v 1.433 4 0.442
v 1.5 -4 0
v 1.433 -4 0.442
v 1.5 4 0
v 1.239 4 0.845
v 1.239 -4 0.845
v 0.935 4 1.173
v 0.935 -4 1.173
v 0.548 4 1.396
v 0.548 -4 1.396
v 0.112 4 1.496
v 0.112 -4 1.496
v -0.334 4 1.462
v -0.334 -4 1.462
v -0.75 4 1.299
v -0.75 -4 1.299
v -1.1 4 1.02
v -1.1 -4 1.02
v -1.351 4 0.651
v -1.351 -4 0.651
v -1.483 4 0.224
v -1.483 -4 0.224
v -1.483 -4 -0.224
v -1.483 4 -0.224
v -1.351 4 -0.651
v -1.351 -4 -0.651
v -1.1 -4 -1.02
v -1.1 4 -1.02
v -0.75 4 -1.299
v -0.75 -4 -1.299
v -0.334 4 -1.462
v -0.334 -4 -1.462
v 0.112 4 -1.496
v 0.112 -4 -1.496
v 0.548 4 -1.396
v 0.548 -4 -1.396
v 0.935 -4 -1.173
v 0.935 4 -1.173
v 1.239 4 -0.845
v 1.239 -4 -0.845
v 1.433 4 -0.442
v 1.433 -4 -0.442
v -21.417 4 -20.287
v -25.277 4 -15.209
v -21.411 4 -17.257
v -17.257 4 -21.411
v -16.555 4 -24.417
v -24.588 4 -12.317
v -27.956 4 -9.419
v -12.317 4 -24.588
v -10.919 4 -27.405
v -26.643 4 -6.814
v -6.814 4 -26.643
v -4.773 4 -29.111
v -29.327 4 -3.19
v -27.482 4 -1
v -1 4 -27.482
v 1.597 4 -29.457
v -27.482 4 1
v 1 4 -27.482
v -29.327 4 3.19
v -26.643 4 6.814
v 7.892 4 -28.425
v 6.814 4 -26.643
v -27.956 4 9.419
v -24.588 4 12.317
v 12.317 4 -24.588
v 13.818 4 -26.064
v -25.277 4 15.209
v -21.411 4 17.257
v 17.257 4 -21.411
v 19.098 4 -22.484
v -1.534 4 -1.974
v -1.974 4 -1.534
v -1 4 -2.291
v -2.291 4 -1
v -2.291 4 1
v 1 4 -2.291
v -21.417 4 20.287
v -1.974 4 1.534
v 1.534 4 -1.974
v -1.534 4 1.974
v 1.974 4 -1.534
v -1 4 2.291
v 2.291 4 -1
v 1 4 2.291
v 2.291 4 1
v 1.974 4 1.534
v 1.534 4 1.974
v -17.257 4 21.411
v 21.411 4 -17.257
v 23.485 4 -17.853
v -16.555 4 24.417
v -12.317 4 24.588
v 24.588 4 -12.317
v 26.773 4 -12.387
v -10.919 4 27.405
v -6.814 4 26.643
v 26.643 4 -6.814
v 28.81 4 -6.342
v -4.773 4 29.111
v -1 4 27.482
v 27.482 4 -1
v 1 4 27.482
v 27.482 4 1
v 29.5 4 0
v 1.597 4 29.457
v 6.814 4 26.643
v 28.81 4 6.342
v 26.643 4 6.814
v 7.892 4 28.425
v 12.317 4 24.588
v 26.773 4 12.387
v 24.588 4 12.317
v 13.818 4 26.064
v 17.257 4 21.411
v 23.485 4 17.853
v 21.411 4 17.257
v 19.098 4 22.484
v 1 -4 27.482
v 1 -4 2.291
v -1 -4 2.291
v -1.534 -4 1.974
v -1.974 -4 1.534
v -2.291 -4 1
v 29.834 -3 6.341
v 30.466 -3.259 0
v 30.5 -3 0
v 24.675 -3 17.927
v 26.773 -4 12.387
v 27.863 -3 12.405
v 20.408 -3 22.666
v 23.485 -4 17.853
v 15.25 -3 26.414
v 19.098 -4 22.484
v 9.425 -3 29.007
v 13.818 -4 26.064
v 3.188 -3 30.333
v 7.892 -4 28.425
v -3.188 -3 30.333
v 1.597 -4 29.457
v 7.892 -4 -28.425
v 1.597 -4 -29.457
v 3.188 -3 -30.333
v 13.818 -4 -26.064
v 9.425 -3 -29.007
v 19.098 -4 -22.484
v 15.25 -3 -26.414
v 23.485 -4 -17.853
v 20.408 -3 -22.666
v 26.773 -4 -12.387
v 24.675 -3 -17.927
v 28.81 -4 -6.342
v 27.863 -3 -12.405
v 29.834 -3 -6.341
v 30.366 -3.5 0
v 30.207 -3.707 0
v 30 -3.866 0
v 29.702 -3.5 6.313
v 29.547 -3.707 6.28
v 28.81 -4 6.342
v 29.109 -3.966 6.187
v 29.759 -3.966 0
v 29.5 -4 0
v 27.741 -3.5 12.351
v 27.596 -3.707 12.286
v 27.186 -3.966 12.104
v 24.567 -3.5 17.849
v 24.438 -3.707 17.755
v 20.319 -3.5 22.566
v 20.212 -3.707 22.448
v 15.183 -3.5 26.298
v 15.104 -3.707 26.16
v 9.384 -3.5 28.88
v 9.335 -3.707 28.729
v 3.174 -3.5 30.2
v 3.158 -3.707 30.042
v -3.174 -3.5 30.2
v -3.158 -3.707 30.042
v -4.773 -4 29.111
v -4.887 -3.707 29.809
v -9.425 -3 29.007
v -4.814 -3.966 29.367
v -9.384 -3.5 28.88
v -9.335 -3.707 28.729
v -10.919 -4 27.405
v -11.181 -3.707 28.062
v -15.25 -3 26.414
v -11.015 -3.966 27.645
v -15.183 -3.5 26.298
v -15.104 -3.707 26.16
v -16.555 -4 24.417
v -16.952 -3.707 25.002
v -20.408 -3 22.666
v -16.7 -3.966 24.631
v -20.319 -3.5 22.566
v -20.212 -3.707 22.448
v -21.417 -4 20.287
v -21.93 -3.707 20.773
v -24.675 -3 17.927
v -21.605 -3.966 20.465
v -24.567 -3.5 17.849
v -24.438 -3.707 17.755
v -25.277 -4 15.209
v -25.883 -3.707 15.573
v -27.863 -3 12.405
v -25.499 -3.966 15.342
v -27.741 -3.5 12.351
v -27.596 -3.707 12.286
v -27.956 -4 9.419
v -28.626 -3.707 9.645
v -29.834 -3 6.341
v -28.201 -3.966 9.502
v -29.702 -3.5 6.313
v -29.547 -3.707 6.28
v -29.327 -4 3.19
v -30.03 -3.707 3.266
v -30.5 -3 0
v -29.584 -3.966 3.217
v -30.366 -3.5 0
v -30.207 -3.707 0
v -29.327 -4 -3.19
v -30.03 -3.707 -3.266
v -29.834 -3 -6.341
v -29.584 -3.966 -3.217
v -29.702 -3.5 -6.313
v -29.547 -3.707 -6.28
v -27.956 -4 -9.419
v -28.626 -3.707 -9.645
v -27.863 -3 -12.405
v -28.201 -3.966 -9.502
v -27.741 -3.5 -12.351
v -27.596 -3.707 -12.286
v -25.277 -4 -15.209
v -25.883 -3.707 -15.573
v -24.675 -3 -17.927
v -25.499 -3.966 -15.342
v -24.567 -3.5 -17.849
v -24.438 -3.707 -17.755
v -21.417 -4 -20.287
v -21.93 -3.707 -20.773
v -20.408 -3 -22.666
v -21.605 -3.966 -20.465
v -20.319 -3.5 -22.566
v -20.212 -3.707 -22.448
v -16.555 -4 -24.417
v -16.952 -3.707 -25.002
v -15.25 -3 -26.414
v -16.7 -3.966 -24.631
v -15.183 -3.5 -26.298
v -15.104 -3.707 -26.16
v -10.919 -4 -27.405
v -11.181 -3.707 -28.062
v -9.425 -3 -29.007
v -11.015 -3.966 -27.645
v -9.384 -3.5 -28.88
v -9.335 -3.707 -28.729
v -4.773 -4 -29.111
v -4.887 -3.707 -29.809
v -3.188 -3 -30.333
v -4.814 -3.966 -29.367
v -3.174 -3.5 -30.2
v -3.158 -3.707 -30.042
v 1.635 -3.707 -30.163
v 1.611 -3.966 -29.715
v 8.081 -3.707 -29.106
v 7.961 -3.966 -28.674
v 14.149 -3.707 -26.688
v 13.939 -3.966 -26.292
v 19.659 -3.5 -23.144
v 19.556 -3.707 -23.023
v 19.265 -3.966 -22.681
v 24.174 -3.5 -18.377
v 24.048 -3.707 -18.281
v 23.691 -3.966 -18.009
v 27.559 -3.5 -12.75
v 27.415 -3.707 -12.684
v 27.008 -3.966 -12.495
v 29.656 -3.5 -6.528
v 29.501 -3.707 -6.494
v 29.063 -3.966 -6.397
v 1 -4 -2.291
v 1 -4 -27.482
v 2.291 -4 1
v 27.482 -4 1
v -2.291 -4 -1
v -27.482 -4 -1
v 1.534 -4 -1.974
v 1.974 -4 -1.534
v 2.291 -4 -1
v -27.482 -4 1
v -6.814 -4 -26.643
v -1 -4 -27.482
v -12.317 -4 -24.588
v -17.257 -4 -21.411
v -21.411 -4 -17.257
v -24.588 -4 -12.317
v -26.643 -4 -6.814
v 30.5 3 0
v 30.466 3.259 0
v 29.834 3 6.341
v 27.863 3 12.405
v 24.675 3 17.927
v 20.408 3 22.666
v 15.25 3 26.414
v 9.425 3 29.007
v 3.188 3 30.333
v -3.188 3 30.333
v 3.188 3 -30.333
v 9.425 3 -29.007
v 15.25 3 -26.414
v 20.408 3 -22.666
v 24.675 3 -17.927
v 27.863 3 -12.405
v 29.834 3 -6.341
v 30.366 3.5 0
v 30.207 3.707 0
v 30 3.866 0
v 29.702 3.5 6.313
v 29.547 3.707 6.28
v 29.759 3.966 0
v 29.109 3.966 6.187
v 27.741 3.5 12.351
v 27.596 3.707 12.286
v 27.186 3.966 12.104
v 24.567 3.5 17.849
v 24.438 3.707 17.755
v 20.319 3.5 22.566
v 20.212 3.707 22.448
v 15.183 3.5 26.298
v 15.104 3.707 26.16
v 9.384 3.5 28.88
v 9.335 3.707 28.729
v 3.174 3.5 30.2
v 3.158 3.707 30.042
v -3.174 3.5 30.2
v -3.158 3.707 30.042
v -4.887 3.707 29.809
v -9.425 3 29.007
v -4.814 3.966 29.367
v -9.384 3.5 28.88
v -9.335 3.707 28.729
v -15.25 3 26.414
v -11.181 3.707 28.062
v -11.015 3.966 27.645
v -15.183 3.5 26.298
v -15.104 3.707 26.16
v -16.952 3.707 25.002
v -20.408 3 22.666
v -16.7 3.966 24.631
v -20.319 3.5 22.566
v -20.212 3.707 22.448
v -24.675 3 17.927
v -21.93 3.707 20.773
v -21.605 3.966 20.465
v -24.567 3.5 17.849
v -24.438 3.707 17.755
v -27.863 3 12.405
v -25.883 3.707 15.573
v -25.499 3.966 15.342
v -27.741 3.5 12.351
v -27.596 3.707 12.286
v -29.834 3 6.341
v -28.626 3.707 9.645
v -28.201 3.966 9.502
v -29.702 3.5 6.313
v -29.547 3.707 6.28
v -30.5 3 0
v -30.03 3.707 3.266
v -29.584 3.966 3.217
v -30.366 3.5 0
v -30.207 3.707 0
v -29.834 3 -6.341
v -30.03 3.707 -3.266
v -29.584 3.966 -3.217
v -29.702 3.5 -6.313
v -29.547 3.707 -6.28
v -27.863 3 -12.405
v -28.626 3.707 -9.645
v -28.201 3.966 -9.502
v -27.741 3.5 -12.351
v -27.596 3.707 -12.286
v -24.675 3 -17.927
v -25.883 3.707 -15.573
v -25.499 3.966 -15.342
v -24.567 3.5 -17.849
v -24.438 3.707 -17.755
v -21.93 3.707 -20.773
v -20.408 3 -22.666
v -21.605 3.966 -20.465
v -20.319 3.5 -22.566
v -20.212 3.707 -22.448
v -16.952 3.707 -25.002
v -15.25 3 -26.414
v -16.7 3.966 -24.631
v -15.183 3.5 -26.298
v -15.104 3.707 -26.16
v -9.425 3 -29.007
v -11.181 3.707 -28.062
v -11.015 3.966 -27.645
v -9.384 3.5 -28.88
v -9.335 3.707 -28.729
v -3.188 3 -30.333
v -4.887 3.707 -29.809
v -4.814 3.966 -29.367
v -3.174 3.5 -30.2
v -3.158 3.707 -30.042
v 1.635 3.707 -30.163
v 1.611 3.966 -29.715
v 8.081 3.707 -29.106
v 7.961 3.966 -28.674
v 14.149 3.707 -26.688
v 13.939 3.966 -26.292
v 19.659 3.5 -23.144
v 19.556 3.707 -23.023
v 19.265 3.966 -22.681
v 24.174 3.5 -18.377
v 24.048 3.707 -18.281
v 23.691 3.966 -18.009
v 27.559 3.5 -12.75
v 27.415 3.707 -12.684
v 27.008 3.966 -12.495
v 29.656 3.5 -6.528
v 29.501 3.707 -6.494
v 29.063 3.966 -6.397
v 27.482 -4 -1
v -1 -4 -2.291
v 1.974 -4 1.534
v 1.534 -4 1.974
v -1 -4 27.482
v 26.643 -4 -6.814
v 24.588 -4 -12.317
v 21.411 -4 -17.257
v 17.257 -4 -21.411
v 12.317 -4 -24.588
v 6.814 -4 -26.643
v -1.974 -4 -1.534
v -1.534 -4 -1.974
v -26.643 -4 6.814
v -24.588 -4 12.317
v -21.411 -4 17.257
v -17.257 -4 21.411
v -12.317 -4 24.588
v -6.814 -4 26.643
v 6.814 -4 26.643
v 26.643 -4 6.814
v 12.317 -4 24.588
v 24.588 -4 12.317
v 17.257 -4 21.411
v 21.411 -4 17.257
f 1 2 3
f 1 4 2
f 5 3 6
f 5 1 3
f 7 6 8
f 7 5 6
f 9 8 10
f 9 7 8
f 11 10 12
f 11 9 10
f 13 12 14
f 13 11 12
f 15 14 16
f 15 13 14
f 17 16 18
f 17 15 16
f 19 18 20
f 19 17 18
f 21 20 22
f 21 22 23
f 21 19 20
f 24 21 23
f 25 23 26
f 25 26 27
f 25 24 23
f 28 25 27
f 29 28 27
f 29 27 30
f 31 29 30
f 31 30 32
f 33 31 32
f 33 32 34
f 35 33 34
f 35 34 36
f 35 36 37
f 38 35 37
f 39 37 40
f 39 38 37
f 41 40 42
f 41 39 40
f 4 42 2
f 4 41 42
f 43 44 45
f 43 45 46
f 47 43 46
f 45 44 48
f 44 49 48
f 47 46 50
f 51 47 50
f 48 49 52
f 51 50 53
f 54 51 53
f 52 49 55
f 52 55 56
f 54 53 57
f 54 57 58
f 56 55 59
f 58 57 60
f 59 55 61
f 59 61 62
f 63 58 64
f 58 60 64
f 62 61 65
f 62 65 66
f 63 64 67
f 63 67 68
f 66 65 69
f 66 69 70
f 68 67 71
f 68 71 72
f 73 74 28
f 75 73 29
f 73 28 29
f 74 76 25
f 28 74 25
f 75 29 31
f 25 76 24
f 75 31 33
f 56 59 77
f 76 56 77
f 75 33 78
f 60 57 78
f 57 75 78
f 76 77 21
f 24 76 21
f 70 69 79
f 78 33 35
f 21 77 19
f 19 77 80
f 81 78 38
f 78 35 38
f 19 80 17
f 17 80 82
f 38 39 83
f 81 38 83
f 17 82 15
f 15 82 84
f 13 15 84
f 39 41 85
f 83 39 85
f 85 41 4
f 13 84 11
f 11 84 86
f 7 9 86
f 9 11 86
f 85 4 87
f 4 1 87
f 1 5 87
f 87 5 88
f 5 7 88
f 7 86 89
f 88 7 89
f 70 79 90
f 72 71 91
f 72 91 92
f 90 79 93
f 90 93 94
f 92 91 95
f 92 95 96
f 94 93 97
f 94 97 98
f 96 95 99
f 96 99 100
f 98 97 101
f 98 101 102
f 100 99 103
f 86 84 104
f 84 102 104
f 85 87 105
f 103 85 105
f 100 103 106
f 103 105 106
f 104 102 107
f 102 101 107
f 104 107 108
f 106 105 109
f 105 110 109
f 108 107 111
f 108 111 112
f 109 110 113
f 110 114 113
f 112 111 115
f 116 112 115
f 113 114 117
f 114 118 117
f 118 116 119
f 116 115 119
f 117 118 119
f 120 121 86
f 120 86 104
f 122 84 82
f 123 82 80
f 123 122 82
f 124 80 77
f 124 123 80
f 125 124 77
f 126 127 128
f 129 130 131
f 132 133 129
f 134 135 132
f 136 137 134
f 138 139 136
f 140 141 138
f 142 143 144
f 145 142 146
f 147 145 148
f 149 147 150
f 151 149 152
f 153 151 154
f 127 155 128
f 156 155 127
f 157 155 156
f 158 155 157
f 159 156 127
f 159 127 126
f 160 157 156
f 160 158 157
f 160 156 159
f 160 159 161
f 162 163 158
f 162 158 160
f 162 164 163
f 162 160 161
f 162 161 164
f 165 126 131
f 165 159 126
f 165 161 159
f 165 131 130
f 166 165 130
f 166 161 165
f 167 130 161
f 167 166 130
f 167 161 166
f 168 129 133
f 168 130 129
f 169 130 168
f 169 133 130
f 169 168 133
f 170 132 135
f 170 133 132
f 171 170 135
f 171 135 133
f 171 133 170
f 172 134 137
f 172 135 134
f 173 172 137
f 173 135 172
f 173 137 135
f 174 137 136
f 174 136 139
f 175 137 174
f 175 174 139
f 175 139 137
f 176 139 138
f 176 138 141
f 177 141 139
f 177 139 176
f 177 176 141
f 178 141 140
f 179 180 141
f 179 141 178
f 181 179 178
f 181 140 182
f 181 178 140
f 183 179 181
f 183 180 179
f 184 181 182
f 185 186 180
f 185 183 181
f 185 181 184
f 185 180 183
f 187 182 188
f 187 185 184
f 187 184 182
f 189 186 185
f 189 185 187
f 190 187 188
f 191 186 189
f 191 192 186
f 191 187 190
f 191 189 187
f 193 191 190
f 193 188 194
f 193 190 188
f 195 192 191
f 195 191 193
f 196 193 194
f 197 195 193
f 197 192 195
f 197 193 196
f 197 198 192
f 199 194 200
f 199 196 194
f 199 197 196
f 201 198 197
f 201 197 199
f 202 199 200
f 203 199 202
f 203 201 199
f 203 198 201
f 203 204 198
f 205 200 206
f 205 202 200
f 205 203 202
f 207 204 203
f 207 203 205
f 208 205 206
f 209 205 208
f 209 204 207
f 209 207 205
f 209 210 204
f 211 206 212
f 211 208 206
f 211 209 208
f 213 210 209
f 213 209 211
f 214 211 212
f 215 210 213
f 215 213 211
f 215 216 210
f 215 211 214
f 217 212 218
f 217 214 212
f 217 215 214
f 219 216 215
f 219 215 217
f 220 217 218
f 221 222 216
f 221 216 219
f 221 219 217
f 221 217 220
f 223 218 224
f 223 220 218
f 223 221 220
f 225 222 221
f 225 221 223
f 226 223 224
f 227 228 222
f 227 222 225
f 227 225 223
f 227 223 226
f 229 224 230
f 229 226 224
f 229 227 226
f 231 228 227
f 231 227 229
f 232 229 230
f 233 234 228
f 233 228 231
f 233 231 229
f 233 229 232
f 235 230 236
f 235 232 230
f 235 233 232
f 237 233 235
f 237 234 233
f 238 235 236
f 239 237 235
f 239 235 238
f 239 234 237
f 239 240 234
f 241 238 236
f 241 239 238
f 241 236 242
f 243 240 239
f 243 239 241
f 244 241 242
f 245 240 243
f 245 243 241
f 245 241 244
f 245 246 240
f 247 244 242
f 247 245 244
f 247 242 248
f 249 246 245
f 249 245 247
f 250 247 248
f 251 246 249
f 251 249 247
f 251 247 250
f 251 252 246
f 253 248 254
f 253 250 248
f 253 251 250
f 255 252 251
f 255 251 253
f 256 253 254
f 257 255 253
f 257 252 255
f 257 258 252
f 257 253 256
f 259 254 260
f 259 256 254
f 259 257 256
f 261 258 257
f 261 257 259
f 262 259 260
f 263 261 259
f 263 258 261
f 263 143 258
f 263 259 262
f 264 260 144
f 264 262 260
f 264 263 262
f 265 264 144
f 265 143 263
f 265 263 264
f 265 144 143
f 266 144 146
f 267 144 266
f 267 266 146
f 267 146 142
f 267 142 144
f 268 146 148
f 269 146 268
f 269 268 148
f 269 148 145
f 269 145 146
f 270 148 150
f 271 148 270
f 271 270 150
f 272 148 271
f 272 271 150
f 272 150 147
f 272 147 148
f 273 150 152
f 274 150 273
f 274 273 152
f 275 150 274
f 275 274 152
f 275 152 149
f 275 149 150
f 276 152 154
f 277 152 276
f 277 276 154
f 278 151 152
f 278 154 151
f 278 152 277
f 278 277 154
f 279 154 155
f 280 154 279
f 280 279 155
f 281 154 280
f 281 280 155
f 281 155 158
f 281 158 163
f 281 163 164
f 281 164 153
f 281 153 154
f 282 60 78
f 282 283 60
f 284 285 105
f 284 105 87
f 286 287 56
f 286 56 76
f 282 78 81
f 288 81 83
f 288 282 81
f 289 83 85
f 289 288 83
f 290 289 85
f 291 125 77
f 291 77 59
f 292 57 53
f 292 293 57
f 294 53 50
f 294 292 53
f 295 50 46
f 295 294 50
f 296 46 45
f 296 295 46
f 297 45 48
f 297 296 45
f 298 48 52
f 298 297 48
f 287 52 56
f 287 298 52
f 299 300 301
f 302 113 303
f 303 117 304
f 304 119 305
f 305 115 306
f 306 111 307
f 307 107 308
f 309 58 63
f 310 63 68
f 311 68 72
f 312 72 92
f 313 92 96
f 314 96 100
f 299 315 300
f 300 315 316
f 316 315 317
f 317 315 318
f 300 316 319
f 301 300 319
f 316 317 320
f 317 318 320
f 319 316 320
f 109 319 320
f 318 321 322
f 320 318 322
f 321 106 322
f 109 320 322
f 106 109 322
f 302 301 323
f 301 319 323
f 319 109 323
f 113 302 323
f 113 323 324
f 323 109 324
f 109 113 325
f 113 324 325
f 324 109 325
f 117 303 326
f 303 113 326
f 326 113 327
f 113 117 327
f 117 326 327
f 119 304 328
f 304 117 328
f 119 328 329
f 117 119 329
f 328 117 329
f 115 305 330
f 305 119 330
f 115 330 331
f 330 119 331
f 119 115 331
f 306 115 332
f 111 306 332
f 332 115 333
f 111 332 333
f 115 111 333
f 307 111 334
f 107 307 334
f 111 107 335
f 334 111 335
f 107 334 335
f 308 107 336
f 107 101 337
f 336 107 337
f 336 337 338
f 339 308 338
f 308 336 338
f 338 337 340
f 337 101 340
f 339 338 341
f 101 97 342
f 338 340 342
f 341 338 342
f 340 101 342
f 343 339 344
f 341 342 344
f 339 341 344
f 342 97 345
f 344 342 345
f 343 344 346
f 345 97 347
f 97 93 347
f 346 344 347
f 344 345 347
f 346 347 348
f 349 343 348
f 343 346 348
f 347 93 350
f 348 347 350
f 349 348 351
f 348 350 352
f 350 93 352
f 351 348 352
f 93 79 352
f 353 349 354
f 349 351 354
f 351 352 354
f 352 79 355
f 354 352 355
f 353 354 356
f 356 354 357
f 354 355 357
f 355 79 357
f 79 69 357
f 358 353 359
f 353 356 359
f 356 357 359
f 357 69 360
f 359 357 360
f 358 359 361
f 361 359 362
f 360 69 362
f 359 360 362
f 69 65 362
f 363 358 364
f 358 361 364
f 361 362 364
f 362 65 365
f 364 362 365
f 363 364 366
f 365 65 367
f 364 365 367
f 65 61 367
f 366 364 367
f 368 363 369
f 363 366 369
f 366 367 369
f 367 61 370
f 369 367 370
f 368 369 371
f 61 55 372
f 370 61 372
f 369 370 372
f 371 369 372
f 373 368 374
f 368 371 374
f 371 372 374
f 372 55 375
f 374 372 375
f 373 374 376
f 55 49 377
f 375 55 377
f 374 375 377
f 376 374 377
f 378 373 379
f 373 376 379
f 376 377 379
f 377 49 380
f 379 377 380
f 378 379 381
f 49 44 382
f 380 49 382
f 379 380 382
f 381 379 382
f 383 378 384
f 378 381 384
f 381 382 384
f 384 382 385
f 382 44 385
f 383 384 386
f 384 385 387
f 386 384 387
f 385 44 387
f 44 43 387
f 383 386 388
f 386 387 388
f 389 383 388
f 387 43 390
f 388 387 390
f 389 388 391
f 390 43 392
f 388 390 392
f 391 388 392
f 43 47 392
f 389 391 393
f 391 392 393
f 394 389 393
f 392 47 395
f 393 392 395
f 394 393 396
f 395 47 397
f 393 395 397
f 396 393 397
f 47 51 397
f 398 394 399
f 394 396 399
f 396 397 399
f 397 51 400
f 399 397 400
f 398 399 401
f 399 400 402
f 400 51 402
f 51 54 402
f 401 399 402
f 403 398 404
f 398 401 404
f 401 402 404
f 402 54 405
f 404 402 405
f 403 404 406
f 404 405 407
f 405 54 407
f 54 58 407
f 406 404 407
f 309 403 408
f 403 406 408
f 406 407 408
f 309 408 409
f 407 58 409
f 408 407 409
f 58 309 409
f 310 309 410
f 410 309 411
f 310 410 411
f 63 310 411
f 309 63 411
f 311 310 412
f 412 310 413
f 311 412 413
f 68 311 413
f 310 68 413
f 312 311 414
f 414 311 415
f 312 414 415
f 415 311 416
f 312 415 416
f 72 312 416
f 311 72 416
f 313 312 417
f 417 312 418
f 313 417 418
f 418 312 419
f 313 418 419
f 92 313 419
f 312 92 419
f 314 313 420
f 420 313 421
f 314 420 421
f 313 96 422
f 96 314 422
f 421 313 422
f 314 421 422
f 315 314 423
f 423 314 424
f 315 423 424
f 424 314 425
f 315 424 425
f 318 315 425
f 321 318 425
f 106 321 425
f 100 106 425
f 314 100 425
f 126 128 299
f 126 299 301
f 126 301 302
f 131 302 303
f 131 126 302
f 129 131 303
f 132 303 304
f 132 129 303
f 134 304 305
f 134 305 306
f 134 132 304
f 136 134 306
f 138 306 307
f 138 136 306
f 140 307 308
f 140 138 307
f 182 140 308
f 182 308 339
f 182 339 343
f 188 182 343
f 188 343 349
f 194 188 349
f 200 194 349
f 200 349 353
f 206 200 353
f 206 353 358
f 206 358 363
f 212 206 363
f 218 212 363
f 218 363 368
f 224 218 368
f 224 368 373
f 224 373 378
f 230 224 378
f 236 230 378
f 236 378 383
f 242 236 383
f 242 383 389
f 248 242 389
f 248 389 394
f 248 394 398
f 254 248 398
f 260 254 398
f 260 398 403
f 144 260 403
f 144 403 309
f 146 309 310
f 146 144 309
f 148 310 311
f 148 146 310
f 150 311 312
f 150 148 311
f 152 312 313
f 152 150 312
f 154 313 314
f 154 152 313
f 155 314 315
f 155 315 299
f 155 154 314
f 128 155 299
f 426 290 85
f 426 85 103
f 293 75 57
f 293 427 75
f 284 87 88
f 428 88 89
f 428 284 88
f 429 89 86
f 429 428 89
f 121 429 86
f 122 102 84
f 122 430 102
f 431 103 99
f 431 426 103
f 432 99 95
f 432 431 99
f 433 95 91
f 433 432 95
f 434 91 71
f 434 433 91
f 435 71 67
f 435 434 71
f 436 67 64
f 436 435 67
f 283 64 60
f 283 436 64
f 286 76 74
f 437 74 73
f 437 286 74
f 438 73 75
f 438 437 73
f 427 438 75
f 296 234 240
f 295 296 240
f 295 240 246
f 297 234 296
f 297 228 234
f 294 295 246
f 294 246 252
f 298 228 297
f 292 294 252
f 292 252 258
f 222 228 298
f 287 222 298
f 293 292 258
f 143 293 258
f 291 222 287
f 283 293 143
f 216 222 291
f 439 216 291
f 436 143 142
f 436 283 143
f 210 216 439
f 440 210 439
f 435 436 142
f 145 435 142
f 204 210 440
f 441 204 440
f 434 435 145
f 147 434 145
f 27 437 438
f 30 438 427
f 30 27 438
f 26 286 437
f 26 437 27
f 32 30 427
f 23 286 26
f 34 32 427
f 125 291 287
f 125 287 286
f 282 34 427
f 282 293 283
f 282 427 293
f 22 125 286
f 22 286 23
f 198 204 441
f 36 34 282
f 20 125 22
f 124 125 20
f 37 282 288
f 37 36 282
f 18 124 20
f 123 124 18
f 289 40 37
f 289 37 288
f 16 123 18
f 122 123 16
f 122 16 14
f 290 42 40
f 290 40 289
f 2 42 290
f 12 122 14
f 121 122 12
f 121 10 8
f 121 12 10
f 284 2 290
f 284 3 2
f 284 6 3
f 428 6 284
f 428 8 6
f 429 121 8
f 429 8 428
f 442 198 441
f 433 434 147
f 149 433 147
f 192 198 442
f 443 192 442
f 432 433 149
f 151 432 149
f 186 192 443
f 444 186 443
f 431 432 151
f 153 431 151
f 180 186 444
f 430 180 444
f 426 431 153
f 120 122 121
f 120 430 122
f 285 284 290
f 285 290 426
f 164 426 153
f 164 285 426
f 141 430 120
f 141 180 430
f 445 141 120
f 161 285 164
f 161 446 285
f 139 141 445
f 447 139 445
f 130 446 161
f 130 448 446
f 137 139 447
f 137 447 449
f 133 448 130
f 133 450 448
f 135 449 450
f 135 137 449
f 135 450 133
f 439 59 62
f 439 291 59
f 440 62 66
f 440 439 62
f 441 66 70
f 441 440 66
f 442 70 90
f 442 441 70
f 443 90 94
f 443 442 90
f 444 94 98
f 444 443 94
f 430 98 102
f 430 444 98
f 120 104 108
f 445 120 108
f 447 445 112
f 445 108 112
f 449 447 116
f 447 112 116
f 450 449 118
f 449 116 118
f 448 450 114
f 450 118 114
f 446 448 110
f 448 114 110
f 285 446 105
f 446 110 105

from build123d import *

# Parameters (mm, degrees)
F0_R     = 30.5
F0_R_2   = 1.5000000096
F1_DEPTH = 4
F2_R     = 1


with BuildPart() as f1:
    # F0 (on Front) → F1 (new body, symmetric)
    with BuildSketch(Plane.XZ):
        Circle(F0_R)
        with BuildLine():
            Line((-27.4818121673, -1), (-2.2912878475, -1))
            ThreePointArc((-2.2912878475, -1), (-1.767766953, -1.767766953), (-1, -2.2912878475))
            Line((-1, -2.2912878475), (-1, -27.4818121673))
            ThreePointArc((-1, -27.4818121673), (-19.4454364826, -19.4454364826), (-27.4818121673, -1))
        make_face(mode=Mode.SUBTRACT)
        with BuildLine():
            ThreePointArc((1, -2.2912878475), (1.767766953, -1.767766953), (2.2912878475, -1))
            Line((2.2912878475, -1), (27.4818121673, -1))
            ThreePointArc((27.4818121673, -1), (19.4454364826, -19.4454364826), (1, -27.4818121673))
            Line((1, -27.4818121673), (1, -2.2912878475))
        make_face(mode=Mode.SUBTRACT)
        with BuildLine():
            ThreePointArc((-1, 2.2912878475), (-1.767766953, 1.767766953), (-2.2912878475, 1))
            Line((-2.2912878475, 1), (-27.4818121673, 1))
            ThreePointArc((-27.4818121673, 1), (-19.4454364826, 19.4454364826), (-1, 27.4818121673))
            Line((-1, 27.4818121673), (-1, 2.2912878475))
        make_face(mode=Mode.SUBTRACT)
        Circle(F0_R_2, mode=Mode.SUBTRACT)
        with BuildLine():
            ThreePointArc((1, 27.4818121673), (19.4454364826, 19.4454364826), (27.4818121673, 1))
            Line((27.4818121673, 1), (2.2912878475, 1))
            ThreePointArc((2.2912878475, 1), (1.767766953, 1.767766953), (1, 2.2912878475))
            Line((1, 2.2912878475), (1, 27.4818121673))
        make_face(mode=Mode.SUBTRACT)
    extrude(amount=F1_DEPTH, both=True)

    # F2
    f2_edges = [f1.edges().sort_by_distance(p)[0] for p in [
        (-30.5, -4, 0),
        (-30.5, 4, 0),
    ]]
    fillet(f2_edges, radius=F2_R)


solid = f1.part
